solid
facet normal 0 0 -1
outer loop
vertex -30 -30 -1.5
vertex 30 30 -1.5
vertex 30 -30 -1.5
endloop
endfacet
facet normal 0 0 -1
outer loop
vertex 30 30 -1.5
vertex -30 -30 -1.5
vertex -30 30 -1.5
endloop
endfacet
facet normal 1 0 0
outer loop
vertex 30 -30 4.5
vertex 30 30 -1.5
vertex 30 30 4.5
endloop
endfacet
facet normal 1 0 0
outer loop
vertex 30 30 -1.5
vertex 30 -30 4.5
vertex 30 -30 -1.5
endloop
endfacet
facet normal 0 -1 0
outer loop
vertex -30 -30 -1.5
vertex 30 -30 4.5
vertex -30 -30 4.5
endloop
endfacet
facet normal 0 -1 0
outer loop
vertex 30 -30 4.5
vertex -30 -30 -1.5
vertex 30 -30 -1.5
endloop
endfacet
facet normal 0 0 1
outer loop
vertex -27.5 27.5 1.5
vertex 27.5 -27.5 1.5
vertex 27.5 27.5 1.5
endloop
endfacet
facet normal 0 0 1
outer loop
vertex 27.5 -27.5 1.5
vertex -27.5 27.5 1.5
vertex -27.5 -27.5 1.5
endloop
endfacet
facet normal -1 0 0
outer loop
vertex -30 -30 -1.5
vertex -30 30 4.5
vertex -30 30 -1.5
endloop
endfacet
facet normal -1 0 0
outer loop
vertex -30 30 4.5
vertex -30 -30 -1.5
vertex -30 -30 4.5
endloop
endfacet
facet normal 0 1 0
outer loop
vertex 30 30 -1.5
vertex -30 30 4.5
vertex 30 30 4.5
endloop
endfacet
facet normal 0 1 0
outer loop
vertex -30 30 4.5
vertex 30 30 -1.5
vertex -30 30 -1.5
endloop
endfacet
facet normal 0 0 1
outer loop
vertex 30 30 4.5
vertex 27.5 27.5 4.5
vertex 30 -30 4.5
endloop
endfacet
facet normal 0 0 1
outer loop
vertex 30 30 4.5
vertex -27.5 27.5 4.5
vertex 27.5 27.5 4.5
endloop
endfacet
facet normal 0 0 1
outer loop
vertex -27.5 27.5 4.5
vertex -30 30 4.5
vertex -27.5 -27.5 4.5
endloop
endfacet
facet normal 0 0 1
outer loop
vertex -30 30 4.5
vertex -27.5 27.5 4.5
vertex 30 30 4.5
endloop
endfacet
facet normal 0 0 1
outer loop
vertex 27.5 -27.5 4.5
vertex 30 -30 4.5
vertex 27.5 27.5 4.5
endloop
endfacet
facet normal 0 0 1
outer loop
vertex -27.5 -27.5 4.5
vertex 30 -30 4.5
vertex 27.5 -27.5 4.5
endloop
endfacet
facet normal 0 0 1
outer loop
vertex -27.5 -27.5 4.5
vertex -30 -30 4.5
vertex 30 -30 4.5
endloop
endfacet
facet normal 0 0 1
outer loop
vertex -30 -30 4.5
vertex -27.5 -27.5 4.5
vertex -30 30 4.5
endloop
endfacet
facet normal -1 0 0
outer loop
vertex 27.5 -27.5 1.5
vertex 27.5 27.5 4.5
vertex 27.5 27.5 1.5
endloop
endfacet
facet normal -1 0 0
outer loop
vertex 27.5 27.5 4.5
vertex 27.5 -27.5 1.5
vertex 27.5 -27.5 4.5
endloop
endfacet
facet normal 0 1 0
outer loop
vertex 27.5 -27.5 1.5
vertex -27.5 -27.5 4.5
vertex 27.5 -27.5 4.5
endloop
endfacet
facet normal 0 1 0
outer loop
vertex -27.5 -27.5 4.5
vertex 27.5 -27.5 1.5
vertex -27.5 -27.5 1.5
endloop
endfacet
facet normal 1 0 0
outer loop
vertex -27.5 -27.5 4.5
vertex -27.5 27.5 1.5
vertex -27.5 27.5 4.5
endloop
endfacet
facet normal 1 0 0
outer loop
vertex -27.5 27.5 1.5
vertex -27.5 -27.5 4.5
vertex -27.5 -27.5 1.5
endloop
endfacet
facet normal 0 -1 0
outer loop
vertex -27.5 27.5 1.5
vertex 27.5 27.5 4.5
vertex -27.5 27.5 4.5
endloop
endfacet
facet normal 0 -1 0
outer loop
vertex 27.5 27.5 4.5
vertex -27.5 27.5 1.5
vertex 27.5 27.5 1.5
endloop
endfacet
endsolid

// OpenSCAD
/*
 * Tao Steps Stamp. Two feet, side by side.
 */
 echo(version=version());

logo1 = "images/footprint_left.png";
logo2 = "images/footprint_right.png";
logoy = 450; // 343; 
logox = 550; // 626; 

module roundedRect(size, radius) {  
	linear_extrude(height=size.z, center=true) {
		offset(radius) offset(-radius) {
			square([size.x, size.y], center = true);
		}
	}
}


// Base plate
// ----------
plateWidth = 60; // 80;
plateLength = 60; // 80;
plateThickNess = 3;
cornerRadius = 0;
ratio = 0.5;

module oneStep() {
  translate([-10, 0, 2]) {
    scale([ratio * ((plateLength / 1) / 1) / logox, 
           ratio * plateWidth / logoy, .02]) {
      color("red") { // Port
        rotate([0, 0, -0]) {
          surface(file=logo1, invert=true, center=true);
        }
      }
    }
  }
  translate([10, 0, 2]) {
    scale([ratio * ((plateLength / 1) / 1) / logox, 
           ratio * plateWidth / logoy, .02]) {
      color("green") { // Starboard
        rotate([0, 0, -0]) {
          surface(file=logo2, invert=true, center=true);
        }
      }
    }
  }
}

//color("green") {
difference() {  
	union() {
		difference() {
			roundedRect([plateWidth, plateLength, plateThickNess], cornerRadius);
      oneStep();
		}
		// The frame
		translate([0, 0, (plateThickNess / 1)]) {
			difference() {
				roundedRect([plateWidth, plateLength, plateThickNess], cornerRadius);
				roundedRect([plateWidth - 5, plateLength - 5, plateThickNess * 1.1], cornerRadius);
			}
		}
	}
}
//}
